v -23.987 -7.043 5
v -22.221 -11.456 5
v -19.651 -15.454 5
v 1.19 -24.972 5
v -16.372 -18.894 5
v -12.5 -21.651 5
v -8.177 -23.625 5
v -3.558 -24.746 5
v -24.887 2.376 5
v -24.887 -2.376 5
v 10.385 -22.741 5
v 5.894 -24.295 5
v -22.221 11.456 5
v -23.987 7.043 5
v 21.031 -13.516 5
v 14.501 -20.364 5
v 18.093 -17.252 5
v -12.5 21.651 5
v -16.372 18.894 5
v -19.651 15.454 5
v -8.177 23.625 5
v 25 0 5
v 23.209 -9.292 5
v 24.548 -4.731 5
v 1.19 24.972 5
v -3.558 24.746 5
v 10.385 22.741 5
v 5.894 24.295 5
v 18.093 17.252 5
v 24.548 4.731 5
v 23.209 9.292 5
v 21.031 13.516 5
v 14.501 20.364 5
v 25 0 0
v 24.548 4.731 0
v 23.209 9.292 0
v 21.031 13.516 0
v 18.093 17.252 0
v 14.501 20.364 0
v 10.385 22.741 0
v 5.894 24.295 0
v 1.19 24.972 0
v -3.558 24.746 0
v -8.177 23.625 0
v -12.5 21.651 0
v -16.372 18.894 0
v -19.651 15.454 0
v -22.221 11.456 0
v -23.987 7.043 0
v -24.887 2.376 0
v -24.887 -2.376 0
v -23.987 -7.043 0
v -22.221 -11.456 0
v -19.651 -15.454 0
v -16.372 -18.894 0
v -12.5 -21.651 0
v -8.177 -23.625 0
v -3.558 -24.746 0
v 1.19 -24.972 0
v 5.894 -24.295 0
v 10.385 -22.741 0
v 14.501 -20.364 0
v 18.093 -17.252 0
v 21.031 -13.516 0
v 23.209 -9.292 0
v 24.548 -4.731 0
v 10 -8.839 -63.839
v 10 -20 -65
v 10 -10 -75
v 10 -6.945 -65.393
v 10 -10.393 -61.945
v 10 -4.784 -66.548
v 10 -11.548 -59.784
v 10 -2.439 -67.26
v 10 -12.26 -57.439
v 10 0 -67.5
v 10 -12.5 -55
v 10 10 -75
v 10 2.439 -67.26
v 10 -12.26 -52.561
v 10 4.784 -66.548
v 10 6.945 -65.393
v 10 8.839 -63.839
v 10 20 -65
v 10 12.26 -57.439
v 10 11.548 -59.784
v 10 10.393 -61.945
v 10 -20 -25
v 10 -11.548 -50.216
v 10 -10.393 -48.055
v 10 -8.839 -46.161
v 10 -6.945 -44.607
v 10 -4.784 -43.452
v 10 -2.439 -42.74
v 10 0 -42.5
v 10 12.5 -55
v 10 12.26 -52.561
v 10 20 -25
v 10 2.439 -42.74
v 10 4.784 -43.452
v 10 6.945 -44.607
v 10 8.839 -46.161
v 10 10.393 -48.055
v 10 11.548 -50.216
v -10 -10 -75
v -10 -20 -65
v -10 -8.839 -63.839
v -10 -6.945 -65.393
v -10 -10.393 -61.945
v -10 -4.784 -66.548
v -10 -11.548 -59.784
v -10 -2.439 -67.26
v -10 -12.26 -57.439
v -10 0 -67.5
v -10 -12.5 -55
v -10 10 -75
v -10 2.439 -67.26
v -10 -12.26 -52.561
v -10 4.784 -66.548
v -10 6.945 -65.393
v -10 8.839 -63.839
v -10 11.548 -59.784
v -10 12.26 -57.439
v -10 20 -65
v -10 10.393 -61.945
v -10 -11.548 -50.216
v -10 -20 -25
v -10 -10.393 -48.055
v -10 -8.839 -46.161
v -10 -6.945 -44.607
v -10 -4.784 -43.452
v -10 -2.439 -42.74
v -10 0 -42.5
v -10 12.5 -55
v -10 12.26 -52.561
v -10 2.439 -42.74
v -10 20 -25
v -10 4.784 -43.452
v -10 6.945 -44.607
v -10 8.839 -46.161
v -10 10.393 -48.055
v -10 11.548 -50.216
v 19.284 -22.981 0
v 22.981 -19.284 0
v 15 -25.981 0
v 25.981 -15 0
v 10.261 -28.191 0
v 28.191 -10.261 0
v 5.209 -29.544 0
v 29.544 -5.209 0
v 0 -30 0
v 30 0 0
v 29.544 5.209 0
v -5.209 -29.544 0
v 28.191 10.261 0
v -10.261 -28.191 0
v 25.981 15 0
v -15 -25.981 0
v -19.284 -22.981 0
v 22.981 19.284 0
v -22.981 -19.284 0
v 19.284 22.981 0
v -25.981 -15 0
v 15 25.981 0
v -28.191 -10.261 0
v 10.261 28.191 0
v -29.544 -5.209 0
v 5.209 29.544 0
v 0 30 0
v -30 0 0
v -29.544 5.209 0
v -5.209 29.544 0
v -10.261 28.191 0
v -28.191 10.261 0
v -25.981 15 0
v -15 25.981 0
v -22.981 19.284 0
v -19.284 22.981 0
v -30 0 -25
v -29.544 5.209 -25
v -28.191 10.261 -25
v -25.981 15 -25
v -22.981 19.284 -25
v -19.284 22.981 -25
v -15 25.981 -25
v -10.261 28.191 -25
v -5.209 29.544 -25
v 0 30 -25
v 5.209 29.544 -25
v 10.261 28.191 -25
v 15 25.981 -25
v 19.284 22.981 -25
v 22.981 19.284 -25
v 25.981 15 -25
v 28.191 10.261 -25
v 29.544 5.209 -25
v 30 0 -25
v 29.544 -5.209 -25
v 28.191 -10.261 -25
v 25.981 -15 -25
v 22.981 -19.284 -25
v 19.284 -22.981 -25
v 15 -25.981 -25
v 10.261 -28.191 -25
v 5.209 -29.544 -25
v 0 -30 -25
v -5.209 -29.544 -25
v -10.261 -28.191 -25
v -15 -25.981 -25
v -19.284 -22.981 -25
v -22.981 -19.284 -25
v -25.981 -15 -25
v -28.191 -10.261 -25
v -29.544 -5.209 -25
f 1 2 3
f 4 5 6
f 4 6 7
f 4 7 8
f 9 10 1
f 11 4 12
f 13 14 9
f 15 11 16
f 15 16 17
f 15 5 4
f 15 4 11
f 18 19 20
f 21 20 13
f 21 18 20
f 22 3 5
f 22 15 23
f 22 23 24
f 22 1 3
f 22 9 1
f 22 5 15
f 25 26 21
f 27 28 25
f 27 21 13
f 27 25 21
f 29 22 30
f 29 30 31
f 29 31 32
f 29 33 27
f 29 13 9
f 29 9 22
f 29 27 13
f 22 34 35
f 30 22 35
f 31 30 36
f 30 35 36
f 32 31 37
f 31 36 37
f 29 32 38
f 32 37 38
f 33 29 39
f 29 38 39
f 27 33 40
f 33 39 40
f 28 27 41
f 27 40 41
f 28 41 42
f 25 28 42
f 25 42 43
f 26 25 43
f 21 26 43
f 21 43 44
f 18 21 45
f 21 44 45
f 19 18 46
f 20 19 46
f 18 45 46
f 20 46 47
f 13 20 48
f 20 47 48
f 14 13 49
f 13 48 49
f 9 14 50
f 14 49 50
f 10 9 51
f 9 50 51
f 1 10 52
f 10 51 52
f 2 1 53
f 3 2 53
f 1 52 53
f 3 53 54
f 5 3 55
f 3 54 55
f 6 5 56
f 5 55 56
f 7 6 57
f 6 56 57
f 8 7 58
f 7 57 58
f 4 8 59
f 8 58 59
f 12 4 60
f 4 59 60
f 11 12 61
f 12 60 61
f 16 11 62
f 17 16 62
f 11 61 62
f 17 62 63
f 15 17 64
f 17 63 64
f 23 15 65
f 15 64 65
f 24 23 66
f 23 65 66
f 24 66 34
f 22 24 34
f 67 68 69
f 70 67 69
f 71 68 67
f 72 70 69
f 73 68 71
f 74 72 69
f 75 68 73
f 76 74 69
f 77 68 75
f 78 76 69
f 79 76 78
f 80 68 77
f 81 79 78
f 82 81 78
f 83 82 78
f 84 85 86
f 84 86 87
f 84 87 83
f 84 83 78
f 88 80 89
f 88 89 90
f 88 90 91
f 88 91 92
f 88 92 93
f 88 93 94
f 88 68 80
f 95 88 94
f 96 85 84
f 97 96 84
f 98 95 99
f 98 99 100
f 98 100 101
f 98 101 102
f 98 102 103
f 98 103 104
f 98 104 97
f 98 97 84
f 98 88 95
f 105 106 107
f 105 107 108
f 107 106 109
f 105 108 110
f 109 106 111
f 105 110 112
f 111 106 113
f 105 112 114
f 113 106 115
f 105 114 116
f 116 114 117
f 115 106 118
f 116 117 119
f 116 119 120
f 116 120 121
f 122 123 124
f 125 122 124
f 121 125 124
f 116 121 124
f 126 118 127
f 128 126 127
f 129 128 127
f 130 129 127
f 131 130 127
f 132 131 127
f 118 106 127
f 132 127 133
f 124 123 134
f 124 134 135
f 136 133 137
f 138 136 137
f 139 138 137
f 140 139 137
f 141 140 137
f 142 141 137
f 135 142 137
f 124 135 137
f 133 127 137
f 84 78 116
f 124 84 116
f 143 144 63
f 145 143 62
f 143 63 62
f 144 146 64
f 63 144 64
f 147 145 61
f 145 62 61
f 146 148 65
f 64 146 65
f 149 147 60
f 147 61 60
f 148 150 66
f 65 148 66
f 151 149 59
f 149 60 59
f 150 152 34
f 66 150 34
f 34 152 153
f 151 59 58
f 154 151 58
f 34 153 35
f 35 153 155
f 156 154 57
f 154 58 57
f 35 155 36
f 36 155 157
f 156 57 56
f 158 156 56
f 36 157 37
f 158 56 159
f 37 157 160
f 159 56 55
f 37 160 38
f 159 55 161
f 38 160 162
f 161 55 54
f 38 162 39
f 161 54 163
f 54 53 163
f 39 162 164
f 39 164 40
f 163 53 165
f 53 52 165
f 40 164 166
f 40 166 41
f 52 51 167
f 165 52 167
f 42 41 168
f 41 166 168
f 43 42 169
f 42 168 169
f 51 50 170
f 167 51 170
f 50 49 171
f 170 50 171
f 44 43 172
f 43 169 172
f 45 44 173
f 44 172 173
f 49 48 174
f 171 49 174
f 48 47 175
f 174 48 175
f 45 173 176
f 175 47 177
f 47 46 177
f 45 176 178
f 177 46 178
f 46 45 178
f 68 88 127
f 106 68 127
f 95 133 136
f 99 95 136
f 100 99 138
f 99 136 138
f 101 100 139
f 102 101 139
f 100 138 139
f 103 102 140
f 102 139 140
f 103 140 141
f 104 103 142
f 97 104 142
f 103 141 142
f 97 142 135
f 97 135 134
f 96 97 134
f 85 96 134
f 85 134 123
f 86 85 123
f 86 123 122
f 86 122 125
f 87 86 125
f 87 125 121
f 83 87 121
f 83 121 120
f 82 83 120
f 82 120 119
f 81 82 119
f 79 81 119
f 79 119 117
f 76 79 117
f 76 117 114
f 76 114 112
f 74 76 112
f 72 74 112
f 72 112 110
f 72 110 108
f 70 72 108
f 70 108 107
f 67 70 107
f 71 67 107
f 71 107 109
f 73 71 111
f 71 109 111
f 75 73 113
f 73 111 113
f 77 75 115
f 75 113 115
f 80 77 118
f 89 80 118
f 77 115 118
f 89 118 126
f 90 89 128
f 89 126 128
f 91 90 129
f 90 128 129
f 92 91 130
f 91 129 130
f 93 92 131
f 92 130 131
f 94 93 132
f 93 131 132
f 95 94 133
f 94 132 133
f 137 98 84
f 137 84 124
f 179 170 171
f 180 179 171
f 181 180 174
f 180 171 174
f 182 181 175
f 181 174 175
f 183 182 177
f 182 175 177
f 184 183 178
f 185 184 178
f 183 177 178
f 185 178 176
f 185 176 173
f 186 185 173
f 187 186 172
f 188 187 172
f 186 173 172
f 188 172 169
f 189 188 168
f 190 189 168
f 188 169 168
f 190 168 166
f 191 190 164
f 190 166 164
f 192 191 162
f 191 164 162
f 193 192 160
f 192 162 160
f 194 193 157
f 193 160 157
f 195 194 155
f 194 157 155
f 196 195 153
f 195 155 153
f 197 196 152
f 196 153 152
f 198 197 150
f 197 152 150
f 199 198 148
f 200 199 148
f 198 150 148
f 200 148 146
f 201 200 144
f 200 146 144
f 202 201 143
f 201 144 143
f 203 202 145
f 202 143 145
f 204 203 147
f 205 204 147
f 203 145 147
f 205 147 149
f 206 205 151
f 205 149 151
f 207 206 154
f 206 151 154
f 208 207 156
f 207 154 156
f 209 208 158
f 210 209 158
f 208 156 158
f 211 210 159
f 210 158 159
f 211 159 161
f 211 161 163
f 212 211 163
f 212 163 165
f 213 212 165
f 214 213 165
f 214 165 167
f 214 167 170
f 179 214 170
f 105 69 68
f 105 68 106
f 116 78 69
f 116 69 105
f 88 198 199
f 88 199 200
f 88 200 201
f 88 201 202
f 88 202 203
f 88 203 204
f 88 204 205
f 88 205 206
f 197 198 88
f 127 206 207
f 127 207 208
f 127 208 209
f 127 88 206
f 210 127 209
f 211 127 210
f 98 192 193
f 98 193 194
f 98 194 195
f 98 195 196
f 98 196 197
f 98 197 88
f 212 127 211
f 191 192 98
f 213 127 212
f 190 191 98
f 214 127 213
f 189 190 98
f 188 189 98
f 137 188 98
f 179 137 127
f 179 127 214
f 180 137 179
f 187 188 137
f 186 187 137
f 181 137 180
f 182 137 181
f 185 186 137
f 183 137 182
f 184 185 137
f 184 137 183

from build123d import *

# Parameters (mm, degrees)
SKETCH1_R           = 25
BOSS_EXTRUDE1_DEPTH = 5
SKETCH2_R           = 30
BOSS_EXTRUDE2_DEPTH = 25
SKETCH3_W           = 20
SKETCH3_H           = 40
BOSS_EXTRUDE3_DEPTH = 50
CHAMFER1_SIZE       = 10
SKETCH5_R           = 12.5
CUT_EXTRUDE1_DEPTH  = 91.138781887


with BuildPart() as part:
    # Sketch1 → Boss-Extrude1 (new body)
    with BuildSketch(Plane.XY):
        Circle(SKETCH1_R)
    extrude(amount=BOSS_EXTRUDE1_DEPTH)

    # Sketch2 → Boss-Extrude2 (add)
    with BuildSketch(Plane(origin=(0, 0, 0), x_dir=(-1, 0, 0), z_dir=(0, 0, -1))):
        Circle(SKETCH2_R)
    extrude(amount=BOSS_EXTRUDE2_DEPTH)

    # Sketch3 → Boss-Extrude3 (add)
    with BuildSketch(Plane(origin=(0, 0, -25), x_dir=(-1, 0, 0), z_dir=(0, 0, -1))):
        Rectangle(SKETCH3_W, SKETCH3_H)
    extrude(amount=BOSS_EXTRUDE3_DEPTH)

    # Chamfer1
    chamfer1_edges = [part.edges().sort_by_distance(p)[0] for p in [
        (0, 20, -75),
        (0, -20, -75),
    ]]
    chamfer(chamfer1_edges, length=CHAMFER1_SIZE)

    # Sketch5 → Cut-Extrude1 (cut, through all)
    with BuildSketch(Plane.ZY.offset(10)):
        with Locations((-55, 0)):
            Circle(SKETCH5_R)
    extrude(amount=-CUT_EXTRUDE1_DEPTH, mode=Mode.SUBTRACT)


solid = part.part
